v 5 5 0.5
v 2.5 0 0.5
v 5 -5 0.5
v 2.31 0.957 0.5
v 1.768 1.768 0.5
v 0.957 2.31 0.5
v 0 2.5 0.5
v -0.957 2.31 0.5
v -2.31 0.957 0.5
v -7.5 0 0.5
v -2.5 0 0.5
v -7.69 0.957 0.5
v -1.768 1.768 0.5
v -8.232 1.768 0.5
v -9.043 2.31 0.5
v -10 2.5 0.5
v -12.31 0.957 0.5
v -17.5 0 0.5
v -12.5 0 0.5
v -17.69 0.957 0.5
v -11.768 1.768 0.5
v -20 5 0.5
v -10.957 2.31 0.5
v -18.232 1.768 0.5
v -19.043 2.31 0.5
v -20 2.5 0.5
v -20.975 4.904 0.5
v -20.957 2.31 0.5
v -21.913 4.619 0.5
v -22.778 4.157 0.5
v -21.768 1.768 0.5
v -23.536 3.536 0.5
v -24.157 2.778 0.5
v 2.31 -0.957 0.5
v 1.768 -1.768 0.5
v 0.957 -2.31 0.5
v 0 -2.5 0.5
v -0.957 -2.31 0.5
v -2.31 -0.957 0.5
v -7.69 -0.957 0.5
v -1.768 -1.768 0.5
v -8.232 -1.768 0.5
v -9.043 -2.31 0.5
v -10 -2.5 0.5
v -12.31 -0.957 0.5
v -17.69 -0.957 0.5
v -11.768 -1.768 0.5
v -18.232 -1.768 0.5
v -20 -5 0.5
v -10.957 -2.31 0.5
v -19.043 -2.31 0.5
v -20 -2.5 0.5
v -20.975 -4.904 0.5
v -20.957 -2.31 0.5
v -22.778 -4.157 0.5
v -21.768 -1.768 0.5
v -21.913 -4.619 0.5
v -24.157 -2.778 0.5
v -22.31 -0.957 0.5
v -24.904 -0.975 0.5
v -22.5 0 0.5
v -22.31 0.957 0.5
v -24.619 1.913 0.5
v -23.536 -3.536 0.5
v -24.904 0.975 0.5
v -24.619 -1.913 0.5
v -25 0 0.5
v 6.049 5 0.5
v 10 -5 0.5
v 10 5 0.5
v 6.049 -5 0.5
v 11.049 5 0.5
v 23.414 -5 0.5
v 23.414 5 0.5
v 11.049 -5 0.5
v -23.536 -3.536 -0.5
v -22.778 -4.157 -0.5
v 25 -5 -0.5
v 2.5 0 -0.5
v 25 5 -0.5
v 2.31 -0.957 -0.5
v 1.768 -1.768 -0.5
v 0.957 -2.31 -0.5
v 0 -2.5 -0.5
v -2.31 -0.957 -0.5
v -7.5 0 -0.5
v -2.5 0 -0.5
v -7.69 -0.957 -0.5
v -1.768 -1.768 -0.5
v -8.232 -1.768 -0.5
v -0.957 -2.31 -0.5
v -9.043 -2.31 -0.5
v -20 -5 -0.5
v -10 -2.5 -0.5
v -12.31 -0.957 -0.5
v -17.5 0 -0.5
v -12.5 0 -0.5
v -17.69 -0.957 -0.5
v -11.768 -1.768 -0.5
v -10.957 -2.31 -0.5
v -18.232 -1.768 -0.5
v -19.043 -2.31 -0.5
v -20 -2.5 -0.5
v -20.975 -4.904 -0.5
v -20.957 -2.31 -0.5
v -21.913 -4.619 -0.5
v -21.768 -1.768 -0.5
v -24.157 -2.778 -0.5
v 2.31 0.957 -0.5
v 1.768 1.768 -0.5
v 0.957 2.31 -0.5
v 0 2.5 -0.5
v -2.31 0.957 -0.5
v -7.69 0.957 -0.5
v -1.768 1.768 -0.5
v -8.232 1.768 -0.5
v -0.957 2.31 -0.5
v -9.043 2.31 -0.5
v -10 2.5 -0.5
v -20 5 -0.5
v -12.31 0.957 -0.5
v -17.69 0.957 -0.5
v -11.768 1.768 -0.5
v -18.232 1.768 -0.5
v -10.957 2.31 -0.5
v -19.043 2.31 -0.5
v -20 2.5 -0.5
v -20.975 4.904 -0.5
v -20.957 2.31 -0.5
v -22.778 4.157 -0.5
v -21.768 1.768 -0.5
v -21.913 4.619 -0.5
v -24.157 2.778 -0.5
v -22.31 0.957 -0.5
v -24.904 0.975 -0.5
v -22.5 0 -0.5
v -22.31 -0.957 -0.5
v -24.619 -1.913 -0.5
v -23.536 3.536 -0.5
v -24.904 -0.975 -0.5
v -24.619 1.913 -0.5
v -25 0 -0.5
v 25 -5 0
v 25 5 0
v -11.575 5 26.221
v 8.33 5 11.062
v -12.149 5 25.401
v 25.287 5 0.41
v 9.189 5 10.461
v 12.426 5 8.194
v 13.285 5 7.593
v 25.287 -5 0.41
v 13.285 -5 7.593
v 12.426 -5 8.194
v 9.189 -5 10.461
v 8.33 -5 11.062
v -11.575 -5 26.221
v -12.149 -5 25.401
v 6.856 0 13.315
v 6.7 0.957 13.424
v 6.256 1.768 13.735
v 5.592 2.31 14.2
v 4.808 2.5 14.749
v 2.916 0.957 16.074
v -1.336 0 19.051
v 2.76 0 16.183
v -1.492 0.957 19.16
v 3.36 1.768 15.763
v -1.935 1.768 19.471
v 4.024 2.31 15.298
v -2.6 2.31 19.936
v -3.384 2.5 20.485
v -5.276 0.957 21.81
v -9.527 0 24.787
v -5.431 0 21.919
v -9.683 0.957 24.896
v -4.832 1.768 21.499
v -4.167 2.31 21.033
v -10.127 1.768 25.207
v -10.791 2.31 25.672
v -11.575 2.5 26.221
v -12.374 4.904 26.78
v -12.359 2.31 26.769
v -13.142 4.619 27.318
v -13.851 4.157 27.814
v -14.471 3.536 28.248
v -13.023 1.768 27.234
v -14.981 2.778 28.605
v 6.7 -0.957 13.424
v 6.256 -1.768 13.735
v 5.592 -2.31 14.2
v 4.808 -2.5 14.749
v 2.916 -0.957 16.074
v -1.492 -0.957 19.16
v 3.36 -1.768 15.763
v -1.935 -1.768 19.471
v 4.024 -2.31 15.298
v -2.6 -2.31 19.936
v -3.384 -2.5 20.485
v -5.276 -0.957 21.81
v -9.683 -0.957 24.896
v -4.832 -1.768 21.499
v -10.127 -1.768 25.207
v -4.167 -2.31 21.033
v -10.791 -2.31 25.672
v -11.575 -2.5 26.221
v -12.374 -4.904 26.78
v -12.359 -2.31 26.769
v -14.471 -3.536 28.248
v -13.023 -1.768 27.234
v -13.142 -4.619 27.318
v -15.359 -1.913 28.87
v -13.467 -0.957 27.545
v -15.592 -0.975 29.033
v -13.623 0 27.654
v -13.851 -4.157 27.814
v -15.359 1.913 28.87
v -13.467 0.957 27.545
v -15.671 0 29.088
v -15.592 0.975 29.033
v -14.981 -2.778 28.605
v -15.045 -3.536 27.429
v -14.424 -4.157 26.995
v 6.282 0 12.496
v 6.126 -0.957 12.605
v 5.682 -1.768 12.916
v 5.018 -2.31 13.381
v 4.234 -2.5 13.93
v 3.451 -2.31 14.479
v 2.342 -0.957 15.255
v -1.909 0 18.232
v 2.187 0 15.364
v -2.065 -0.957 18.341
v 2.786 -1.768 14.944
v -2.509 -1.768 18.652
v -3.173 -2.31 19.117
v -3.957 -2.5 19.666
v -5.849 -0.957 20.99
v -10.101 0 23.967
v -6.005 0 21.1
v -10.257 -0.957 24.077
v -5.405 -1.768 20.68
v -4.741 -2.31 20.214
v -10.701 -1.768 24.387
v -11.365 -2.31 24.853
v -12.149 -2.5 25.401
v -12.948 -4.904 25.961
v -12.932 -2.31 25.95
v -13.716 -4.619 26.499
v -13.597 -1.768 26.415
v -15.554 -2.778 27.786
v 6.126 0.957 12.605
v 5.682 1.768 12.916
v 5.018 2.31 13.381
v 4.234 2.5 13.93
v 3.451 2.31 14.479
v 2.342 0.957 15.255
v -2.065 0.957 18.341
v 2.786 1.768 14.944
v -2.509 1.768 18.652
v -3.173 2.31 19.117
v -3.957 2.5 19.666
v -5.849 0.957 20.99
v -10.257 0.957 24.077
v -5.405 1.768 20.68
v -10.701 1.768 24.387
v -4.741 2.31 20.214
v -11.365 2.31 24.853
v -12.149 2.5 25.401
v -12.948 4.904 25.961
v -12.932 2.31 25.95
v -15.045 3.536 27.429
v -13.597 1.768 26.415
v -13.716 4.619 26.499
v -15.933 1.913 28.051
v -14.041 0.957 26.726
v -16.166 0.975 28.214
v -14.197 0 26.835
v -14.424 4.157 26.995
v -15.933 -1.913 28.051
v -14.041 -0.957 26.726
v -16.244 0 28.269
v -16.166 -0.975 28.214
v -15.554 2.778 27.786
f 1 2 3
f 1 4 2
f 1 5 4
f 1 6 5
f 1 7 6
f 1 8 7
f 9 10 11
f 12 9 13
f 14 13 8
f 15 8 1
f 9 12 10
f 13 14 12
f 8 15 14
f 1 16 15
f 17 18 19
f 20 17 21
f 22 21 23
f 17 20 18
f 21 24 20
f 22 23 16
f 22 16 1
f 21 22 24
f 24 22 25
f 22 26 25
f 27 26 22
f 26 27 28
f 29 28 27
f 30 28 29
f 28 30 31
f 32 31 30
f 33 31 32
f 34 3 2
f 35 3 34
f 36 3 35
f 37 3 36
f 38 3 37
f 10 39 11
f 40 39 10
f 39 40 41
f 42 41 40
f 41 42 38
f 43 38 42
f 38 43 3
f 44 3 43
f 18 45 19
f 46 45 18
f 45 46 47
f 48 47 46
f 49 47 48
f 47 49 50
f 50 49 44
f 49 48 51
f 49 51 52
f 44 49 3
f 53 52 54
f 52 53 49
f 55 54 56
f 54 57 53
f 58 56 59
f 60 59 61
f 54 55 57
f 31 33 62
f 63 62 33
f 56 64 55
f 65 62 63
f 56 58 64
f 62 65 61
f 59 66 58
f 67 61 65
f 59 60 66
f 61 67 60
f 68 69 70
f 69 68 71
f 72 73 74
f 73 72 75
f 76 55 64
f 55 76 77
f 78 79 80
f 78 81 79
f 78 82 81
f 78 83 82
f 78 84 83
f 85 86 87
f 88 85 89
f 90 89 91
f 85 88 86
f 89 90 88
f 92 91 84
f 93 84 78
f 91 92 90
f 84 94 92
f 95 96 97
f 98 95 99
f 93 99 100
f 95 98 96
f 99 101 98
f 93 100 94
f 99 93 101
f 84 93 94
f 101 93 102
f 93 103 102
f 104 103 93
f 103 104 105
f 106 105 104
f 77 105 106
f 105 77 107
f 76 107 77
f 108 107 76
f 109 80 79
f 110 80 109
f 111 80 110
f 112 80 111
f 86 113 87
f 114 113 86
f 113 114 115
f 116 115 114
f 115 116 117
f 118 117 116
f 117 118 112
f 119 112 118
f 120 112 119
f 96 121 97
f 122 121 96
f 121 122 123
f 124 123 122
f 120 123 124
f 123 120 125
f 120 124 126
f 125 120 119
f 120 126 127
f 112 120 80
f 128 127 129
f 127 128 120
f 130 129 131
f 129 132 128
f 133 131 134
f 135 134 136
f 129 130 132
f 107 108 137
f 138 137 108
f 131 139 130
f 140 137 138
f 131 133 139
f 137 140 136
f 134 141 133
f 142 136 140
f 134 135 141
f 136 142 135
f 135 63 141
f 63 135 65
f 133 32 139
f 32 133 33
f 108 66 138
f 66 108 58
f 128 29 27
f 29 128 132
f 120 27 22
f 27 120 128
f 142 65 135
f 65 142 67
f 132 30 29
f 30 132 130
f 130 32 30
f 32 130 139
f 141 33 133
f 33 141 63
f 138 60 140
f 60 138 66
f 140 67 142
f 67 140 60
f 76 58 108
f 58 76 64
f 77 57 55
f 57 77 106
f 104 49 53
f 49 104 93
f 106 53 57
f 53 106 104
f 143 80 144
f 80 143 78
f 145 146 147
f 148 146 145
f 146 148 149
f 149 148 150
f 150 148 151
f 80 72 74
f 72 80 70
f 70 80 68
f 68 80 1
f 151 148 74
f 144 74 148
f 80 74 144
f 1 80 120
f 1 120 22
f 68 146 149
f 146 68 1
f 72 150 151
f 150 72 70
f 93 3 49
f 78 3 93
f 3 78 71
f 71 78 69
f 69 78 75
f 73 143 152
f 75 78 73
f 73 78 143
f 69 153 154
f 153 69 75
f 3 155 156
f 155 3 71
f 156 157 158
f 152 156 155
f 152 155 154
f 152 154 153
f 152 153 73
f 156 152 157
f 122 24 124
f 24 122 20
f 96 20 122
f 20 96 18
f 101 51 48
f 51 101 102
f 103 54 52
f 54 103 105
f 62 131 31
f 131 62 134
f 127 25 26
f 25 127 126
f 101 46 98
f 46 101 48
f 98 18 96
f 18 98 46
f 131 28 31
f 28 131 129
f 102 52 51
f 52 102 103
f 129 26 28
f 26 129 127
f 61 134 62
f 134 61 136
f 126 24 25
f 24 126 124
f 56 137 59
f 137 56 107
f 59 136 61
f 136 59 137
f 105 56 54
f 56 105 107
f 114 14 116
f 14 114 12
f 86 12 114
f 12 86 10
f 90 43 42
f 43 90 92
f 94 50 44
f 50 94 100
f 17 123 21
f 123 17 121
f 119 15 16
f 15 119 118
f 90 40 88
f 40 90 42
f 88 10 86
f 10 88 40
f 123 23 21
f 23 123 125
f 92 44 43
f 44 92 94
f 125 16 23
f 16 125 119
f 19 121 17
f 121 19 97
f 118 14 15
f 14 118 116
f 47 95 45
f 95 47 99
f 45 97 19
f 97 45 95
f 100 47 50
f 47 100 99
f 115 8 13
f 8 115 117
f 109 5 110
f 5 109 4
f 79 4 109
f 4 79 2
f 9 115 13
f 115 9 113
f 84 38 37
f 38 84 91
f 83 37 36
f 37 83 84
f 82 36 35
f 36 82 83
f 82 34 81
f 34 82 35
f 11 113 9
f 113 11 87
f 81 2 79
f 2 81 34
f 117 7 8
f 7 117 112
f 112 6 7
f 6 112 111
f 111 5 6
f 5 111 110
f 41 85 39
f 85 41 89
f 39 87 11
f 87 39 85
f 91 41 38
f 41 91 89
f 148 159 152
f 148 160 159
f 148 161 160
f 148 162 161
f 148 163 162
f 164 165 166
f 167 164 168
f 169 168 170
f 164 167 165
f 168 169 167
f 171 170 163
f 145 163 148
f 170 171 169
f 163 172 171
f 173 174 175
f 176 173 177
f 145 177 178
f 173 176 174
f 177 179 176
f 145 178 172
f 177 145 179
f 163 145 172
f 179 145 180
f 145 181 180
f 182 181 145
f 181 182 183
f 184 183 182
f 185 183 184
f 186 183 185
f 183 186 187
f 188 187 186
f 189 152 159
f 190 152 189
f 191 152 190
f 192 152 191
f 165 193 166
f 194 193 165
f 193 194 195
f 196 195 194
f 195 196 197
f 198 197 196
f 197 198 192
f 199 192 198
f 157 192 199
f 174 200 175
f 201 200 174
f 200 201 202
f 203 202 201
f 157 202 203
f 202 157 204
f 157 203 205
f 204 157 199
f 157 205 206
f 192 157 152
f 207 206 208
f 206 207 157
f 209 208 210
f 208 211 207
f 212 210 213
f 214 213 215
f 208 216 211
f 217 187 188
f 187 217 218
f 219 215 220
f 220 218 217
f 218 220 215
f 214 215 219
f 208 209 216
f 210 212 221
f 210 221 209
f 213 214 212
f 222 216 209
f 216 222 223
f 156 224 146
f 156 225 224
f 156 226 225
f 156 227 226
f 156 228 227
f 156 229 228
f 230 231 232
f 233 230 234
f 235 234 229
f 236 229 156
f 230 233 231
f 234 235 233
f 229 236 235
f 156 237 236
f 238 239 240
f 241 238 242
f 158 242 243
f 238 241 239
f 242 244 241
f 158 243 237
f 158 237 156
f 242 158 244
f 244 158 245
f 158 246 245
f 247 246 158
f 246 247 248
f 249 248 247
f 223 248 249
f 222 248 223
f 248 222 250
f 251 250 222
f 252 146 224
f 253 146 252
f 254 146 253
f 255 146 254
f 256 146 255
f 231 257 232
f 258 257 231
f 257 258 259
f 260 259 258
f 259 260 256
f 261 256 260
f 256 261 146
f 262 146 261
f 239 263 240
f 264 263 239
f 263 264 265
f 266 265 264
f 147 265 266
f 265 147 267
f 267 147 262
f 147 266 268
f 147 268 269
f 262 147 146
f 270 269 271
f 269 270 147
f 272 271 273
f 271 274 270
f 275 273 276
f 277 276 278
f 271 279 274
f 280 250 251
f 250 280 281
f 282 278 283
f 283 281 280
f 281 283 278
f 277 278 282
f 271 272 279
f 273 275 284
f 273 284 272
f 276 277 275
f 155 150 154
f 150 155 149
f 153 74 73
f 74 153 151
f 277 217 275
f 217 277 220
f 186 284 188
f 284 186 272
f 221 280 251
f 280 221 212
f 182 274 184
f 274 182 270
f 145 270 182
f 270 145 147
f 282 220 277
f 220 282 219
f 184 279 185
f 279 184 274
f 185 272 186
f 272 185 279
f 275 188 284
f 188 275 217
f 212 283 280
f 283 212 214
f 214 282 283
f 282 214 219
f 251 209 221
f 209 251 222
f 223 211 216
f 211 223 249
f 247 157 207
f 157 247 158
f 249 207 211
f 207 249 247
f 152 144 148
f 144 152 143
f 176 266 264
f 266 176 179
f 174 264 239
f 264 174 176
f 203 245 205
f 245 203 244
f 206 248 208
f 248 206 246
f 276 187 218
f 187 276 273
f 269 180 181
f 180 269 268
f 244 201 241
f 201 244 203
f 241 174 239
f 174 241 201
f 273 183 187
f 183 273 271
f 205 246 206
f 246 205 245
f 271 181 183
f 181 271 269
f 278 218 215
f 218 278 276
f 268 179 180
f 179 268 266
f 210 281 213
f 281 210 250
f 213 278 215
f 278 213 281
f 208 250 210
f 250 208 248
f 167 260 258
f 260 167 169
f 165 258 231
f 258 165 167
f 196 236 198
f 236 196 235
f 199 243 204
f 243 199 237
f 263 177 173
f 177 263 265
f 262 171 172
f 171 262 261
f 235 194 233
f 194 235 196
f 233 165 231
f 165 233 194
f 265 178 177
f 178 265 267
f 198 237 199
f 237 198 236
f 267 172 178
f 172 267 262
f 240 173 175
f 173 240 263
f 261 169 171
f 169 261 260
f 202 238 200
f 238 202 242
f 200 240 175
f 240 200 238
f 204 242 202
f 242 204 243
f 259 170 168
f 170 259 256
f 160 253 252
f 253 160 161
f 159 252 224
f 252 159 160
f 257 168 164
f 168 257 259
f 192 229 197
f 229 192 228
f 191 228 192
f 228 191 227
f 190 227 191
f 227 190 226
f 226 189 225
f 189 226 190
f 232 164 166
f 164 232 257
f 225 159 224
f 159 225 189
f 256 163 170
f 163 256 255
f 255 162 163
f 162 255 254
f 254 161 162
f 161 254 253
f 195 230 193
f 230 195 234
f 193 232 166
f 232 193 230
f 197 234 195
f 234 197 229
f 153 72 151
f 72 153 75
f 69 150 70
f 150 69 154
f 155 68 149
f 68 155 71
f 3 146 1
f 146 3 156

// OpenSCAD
/* [Plates] */

thickness = 1.0; // mm
width = 10.0; // mm
total_length = 50.0; //mm

/* [Holes] */

hole_diameter = 5.0; // mm
hole_distances_from_center = [-20, -10, 0.0]; // [mm]

/* [Angle] */

bracket_angle = 35.0; // degrees

/* [Braces] */

bracing_thickness = 1.0; // mm
bracing_distances_from_corner = [15.0, 20.0]; // [mm]

/* [Advanced] */

$fa = 1.0;
$fs = 1.0;

module Semi_Rounded_Bracket(thickness, width, total_length, center_position=[0,0,0], orientation=[0,0,0])
{   
    translate(center_position)
    rotate(orientation)
    {
        difference()
        {
            union()
            {
                cube([total_length - width, width, thickness], center=true);
                {
                    for (sign = [-1, +1])
                    translate([(total_length - total_length/2 - width/2)*sign, 0, 0])
                    {
                        if (sign == -1) cylinder(r=width/2, h=thickness, center=true);
                        if (sign == +1) cube([width, width, thickness], center=true);
                    };
                };
            };
            union()
            {   for (hole_distance_from_center = hole_distances_from_center)
                translate([hole_distance_from_center, 0, 0])
                {
                    cylinder(r=hole_diameter/2, h=thickness + 1.0, center=true);
                };
            }
        }
    }
}

module Brace(bracing_distance_from_corner)
{
    c = sqrt(2) * bracing_distance_from_corner * sqrt(1 - cos(bracket_angle/2));
    intersection()
    {
        translate([total_length/2 - bracing_distance_from_corner, -width/2, thickness/2])
        {
            rotate([0, bracket_angle/2, 0])
            {
                cube([bracing_thickness, width, 2 * c]);
            };
        };
        
        // These two cubes are used to trim the angled cube intersections
        translate([0,0,total_length/2])
        cube([total_length + thickness, width, total_length], center=true);
        
        d = total_length * (1 - cos(bracket_angle));
        e = total_length * (1 - sin(bracket_angle)); 
        
        rotate([0, bracket_angle,0])
        translate([-d/2, 0, -e/2])
        cube([total_length + thickness, width, total_length], center=true);
    }
}

union()
{
    Semi_Rounded_Bracket(thickness, width, total_length);
    Semi_Rounded_Bracket(thickness, width, total_length, center_position=[(total_length/2)*(1-cos(bracket_angle)), 0, (total_length/2)*sin(bracket_angle)], orientation=[0,bracket_angle,0]);
    union()
    {   for (bracing_distance_from_corner = bracing_distances_from_corner)
        Brace(bracing_distance_from_corner);
    }
}
